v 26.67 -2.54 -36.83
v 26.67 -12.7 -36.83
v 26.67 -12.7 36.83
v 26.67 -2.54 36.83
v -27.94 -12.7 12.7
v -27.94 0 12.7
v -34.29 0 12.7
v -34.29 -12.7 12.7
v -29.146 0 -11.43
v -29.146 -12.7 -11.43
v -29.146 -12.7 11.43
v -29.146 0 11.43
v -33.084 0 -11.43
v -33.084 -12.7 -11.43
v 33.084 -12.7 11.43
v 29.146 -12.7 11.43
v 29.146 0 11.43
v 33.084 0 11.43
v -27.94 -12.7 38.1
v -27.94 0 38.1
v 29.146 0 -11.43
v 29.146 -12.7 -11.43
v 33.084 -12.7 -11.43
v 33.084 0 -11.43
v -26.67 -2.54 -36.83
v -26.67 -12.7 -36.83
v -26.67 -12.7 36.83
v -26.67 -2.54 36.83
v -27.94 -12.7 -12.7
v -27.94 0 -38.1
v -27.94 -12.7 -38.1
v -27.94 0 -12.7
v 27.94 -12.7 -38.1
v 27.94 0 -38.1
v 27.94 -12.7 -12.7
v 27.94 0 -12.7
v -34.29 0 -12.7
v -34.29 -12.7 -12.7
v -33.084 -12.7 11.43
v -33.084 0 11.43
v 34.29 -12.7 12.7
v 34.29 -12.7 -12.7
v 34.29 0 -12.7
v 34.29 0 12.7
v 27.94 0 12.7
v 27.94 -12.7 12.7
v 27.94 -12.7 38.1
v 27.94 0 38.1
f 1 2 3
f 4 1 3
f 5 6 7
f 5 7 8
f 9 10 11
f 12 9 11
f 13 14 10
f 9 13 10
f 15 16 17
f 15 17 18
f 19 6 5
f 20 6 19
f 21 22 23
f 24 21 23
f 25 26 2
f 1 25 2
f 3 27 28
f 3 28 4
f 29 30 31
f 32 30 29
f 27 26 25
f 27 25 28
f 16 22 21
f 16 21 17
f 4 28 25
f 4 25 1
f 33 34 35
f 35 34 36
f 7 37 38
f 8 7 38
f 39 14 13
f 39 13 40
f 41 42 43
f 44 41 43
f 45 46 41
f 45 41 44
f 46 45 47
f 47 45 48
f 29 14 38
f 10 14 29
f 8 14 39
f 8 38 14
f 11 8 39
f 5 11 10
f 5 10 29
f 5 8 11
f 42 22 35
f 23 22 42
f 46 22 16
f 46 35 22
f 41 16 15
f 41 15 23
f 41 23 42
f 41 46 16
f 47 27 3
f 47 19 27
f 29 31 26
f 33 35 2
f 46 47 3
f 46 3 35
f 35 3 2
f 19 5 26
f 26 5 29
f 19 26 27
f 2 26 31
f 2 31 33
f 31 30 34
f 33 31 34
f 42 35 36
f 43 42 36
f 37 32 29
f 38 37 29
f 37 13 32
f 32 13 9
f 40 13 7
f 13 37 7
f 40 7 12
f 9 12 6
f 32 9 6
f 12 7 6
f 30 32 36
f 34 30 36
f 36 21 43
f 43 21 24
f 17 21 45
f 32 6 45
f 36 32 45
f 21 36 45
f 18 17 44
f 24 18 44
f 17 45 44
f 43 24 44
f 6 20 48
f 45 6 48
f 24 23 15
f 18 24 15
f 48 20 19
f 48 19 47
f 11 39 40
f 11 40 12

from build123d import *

# Parameters (mm, degrees)
F0_W     = 55.88
F0_H     = 76.2
F1_DEPTH = 12.7
F2_W     = 53.34
F2_H     = 73.66
F3_DEPTH = 10.16
F4_W     = 12.7
F4_H     = 25.4
F5_DEPTH = 6.35
F6_W     = 12.7
F6_H     = 25.4
F7_DEPTH = 6.35
F8_W     = 3.937
F8_H     = 22.86
F9_DEPTH = 25.4


with BuildPart() as f1:
    # F0 (on Front) → F1 (new body)
    with BuildSketch(Plane.XZ):
        Rectangle(F0_W, F0_H)
    extrude(amount=F1_DEPTH)

    # F2 (on face) → F3 (cut)
    with BuildSketch(Plane.XZ.offset(12.7)):
        Rectangle(F2_W, F2_H)
    extrude(amount=-F3_DEPTH, mode=Mode.SUBTRACT)

    # F4 (on face) → F5 (join)
    with BuildSketch(Plane.YZ.offset(27.94)):
        with Locations((-6.35, 0)):
            Rectangle(F4_W, F4_H)
    extrude(amount=F5_DEPTH)

    # F6 (on face) → F7 (join)
    with BuildSketch(Plane(origin=(-27.94, 0, 0), x_dir=(0, -1, 0), z_dir=(-1, 0, 0))):
        with Locations((6.35, 0)):
            Rectangle(F6_W, F6_H)
    extrude(amount=F7_DEPTH)

    # F8 (on face) → F9 (cut)
    with BuildSketch(Plane.XZ.offset(12.7)):
        with Locations((-31.115, 0)):
            Rectangle(F8_W, F8_H)
        with Locations((31.115, 0)):
            Rectangle(F8_W, F8_H)
    extrude(amount=-F9_DEPTH, mode=Mode.SUBTRACT)


solid = f1.part
